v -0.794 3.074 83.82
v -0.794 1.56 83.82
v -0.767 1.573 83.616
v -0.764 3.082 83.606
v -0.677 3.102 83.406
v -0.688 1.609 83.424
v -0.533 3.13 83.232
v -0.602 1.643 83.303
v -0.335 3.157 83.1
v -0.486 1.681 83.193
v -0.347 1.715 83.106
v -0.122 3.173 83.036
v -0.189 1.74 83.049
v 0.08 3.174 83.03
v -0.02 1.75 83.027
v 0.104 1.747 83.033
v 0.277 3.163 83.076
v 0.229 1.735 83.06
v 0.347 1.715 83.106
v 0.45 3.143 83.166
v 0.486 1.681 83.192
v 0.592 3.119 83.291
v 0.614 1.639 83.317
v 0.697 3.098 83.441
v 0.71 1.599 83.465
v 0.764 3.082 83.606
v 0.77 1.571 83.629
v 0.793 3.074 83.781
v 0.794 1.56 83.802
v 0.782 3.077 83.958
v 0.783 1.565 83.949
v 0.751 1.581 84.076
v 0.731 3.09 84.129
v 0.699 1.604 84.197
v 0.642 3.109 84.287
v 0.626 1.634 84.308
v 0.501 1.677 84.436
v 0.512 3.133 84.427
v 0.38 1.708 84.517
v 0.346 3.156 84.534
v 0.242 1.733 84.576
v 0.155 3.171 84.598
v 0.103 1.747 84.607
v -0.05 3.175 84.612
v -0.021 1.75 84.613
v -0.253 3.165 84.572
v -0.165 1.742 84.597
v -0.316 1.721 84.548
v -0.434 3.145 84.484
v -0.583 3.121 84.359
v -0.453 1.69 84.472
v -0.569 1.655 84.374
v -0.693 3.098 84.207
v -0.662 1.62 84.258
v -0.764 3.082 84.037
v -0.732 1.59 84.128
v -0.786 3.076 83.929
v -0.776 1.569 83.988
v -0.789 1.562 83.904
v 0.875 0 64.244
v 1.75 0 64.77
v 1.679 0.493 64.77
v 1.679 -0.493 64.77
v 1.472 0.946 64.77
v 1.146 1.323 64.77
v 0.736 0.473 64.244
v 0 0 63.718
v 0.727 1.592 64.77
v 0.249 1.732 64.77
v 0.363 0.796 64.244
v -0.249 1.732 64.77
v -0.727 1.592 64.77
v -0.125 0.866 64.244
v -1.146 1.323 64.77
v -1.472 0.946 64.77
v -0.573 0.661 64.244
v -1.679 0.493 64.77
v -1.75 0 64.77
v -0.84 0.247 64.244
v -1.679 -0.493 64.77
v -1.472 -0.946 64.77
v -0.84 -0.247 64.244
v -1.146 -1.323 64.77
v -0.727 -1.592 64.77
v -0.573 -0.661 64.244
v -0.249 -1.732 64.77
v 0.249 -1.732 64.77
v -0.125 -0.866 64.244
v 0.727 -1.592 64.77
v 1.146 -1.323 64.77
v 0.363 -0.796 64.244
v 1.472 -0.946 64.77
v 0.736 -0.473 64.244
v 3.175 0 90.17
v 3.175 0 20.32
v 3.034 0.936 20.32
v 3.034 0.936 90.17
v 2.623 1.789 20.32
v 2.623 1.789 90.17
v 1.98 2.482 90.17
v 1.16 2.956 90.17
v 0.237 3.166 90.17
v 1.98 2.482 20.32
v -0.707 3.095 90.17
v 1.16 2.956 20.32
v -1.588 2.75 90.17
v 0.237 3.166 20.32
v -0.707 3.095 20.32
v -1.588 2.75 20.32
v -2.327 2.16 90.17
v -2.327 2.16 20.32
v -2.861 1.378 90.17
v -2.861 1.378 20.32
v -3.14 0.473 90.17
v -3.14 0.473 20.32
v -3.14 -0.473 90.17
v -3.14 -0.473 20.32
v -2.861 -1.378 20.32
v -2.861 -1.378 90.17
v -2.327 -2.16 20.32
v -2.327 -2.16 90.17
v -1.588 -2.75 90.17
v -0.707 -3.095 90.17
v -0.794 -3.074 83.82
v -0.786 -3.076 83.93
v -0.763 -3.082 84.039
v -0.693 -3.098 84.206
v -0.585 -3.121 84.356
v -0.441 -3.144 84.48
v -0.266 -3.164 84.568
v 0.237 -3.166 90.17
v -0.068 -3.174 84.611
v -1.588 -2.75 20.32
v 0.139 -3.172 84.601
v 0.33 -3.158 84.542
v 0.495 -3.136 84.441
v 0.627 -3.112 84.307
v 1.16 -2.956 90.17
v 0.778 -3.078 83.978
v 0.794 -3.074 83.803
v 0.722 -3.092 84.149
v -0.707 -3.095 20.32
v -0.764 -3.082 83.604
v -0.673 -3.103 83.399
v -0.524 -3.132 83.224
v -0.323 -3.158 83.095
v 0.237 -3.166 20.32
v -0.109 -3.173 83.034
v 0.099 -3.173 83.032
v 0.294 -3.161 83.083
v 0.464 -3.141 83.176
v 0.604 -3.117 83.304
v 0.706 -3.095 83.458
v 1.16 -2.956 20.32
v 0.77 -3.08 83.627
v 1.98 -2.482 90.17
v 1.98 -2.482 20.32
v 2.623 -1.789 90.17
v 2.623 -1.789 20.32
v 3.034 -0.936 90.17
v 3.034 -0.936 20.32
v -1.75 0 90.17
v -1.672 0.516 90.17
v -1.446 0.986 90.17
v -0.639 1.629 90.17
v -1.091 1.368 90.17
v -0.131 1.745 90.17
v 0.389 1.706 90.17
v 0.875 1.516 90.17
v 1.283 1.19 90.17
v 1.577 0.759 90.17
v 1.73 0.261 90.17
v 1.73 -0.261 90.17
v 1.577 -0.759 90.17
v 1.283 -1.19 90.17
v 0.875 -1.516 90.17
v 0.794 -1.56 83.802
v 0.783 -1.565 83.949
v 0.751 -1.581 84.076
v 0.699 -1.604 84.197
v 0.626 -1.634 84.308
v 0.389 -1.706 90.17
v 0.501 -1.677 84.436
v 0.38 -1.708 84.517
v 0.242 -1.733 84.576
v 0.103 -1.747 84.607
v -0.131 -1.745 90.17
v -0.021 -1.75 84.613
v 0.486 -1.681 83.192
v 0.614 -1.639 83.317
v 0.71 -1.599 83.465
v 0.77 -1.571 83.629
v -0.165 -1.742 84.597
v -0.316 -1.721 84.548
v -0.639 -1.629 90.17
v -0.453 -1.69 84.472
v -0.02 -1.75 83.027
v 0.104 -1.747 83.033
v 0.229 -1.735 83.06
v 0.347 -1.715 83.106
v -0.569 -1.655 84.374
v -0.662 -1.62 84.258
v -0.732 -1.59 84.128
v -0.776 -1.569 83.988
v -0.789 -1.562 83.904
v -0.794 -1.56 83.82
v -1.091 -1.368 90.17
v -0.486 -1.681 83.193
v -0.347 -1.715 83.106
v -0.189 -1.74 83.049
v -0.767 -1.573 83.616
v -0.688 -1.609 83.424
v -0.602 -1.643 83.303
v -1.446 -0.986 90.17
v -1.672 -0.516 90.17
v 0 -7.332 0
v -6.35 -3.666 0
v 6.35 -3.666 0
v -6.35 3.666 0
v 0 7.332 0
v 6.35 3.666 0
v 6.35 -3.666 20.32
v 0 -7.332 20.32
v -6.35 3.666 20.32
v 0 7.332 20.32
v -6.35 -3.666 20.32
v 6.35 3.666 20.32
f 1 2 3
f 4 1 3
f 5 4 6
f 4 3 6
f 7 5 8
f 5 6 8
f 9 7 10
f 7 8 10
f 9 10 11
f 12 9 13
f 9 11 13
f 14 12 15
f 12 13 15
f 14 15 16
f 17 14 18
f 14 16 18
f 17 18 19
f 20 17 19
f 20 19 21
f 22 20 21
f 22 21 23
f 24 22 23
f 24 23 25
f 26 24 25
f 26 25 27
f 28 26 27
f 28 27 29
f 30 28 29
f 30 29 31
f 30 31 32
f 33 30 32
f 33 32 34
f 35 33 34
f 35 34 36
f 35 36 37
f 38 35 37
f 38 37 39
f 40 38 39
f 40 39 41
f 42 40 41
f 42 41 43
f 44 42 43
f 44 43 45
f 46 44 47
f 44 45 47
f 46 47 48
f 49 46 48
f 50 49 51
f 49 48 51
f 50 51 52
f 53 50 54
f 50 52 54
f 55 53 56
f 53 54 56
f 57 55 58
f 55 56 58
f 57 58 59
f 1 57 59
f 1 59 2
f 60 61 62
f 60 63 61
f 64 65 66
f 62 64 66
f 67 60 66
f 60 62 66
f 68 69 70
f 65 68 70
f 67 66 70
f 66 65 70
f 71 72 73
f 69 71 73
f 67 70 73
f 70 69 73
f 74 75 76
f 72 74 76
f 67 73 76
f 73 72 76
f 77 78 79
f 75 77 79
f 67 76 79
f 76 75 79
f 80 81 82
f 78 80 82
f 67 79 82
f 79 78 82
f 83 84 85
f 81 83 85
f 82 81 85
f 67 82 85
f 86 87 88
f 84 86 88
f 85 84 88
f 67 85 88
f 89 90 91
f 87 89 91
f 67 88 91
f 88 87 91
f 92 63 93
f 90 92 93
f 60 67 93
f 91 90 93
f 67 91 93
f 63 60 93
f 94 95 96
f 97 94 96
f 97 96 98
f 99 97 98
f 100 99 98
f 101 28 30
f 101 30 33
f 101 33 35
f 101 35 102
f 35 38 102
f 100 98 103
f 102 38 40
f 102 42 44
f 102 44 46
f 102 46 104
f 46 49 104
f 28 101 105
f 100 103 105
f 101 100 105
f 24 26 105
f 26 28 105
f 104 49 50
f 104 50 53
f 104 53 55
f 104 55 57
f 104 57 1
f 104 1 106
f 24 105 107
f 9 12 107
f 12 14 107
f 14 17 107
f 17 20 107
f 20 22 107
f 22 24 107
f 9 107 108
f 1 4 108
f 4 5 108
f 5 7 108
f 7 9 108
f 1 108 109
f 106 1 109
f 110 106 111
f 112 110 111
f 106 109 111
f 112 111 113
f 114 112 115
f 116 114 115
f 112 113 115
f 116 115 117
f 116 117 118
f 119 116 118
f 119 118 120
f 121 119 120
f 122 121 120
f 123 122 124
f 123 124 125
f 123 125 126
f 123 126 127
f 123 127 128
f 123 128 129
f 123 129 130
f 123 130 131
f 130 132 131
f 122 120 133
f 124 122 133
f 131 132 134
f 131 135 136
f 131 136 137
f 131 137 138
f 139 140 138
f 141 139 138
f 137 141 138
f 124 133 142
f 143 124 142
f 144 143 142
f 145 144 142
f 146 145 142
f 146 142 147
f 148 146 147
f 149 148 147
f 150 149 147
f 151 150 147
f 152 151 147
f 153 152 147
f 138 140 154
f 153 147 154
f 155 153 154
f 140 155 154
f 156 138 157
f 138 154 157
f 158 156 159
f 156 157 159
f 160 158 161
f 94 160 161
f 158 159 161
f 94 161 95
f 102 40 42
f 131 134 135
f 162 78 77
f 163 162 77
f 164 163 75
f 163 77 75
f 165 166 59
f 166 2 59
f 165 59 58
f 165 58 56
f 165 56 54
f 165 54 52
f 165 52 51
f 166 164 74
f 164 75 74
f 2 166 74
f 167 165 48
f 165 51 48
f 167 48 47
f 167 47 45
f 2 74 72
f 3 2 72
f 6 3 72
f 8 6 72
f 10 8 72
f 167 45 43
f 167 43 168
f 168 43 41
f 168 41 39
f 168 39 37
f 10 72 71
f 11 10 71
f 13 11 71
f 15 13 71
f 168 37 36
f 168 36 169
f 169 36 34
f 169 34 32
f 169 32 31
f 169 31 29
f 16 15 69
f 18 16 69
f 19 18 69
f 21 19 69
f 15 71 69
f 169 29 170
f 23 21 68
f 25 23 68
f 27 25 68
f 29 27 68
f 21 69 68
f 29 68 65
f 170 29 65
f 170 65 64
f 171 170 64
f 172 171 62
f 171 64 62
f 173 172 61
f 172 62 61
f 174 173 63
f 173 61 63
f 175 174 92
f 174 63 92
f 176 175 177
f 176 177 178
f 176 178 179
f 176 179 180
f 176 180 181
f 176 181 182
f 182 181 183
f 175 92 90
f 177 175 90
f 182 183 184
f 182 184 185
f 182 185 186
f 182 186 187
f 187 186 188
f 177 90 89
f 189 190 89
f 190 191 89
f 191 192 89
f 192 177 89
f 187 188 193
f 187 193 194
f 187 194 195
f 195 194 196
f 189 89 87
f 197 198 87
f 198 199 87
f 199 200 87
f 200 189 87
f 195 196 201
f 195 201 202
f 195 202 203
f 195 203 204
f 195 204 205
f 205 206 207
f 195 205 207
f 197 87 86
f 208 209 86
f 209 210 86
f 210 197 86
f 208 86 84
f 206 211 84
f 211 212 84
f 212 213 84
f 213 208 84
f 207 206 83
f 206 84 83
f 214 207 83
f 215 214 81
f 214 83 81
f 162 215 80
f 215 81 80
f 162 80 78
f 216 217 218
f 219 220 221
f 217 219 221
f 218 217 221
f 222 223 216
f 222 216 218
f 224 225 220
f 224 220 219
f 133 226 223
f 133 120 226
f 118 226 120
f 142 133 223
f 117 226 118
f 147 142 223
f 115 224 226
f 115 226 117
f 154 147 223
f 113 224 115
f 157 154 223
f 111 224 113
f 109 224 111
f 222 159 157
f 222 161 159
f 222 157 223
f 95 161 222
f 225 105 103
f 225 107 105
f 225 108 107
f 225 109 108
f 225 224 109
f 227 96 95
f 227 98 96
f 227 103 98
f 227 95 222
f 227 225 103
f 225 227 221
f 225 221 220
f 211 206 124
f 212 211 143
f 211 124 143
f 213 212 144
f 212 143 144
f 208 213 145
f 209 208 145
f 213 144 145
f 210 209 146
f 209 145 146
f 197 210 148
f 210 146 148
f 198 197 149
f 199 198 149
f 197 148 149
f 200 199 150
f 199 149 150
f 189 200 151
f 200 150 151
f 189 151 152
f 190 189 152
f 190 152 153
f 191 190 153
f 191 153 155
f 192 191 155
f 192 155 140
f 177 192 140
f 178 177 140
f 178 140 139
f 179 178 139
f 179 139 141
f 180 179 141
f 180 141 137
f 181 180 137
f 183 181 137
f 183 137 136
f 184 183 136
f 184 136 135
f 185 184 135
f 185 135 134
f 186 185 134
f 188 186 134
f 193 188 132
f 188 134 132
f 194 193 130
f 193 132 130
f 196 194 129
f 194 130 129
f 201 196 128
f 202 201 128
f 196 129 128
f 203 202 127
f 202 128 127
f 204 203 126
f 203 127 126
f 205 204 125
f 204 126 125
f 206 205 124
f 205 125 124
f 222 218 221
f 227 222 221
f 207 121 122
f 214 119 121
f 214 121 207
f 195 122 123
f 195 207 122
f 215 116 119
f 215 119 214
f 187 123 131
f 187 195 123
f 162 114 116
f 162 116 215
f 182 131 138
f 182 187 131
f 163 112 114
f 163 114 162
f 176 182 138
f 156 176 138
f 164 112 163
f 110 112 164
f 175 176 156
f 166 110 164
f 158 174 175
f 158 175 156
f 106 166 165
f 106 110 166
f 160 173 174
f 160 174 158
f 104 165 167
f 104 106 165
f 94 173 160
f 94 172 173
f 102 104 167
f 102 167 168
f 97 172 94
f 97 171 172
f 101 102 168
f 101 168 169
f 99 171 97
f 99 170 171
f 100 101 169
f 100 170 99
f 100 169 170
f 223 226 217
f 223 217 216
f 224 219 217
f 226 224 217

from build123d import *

# Parameters (mm, degrees)
BOSS_EXTRUDE1_DEPTH            = 20.32
SKETCH2_R                      = 3.175
BOSS_EXTRUDE2_DEPTH            = 69.85
F_3_5_3_5_DIAMETER_HOLE1_D     = 3.5
F_3_5_3_5_DIAMETER_HOLE1_DEPTH = 25.4
F_3_5_3_5_DIAMETER_HOLE1_TIP   = 1.051506083
F_1_16_0_0625_DIAMETER_HOLE1_D = 1.5875


with BuildPart() as part:
    # Sketch1 → Boss-Extrude1 (new body)
    with BuildSketch(Plane.XY):
        Polygon((0, 7.332348419), (-6.35, 3.666174209), (-6.35, -3.666174209), (0, -7.332348419), (6.35, -3.666174209), (6.35, 3.666174209), align=None)
    extrude(amount=BOSS_EXTRUDE1_DEPTH)

    # Sketch2 → Boss-Extrude2 (add)
    with BuildSketch(Plane.XY.offset(20.32)):
        Circle(SKETCH2_R)
    extrude(amount=BOSS_EXTRUDE2_DEPTH)

    # Ø3.5 (3.5) Diameter Hole1
    with Locations(Plane.XY.offset(90.17)):
        with Locations((0, 0)):
            Hole(F_3_5_3_5_DIAMETER_HOLE1_D / 2, depth=F_3_5_3_5_DIAMETER_HOLE1_DEPTH)
            with Locations((0, 0, -(F_3_5_3_5_DIAMETER_HOLE1_DEPTH + F_3_5_3_5_DIAMETER_HOLE1_TIP / 2))):  # 118° drill point
                Cone(0, F_3_5_3_5_DIAMETER_HOLE1_D / 2, F_3_5_3_5_DIAMETER_HOLE1_TIP, mode=Mode.SUBTRACT)

    # 1/16 (0.0625) Diameter Hole1 (through all)
    with Locations(Plane(origin=(0, 7.62, 0), x_dir=(1, 0, 0), z_dir=(0, 1, 0))):
        with Locations((0, -83.82)):
            Hole(F_1_16_0_0625_DIAMETER_HOLE1_D / 2)


solid = part.part
